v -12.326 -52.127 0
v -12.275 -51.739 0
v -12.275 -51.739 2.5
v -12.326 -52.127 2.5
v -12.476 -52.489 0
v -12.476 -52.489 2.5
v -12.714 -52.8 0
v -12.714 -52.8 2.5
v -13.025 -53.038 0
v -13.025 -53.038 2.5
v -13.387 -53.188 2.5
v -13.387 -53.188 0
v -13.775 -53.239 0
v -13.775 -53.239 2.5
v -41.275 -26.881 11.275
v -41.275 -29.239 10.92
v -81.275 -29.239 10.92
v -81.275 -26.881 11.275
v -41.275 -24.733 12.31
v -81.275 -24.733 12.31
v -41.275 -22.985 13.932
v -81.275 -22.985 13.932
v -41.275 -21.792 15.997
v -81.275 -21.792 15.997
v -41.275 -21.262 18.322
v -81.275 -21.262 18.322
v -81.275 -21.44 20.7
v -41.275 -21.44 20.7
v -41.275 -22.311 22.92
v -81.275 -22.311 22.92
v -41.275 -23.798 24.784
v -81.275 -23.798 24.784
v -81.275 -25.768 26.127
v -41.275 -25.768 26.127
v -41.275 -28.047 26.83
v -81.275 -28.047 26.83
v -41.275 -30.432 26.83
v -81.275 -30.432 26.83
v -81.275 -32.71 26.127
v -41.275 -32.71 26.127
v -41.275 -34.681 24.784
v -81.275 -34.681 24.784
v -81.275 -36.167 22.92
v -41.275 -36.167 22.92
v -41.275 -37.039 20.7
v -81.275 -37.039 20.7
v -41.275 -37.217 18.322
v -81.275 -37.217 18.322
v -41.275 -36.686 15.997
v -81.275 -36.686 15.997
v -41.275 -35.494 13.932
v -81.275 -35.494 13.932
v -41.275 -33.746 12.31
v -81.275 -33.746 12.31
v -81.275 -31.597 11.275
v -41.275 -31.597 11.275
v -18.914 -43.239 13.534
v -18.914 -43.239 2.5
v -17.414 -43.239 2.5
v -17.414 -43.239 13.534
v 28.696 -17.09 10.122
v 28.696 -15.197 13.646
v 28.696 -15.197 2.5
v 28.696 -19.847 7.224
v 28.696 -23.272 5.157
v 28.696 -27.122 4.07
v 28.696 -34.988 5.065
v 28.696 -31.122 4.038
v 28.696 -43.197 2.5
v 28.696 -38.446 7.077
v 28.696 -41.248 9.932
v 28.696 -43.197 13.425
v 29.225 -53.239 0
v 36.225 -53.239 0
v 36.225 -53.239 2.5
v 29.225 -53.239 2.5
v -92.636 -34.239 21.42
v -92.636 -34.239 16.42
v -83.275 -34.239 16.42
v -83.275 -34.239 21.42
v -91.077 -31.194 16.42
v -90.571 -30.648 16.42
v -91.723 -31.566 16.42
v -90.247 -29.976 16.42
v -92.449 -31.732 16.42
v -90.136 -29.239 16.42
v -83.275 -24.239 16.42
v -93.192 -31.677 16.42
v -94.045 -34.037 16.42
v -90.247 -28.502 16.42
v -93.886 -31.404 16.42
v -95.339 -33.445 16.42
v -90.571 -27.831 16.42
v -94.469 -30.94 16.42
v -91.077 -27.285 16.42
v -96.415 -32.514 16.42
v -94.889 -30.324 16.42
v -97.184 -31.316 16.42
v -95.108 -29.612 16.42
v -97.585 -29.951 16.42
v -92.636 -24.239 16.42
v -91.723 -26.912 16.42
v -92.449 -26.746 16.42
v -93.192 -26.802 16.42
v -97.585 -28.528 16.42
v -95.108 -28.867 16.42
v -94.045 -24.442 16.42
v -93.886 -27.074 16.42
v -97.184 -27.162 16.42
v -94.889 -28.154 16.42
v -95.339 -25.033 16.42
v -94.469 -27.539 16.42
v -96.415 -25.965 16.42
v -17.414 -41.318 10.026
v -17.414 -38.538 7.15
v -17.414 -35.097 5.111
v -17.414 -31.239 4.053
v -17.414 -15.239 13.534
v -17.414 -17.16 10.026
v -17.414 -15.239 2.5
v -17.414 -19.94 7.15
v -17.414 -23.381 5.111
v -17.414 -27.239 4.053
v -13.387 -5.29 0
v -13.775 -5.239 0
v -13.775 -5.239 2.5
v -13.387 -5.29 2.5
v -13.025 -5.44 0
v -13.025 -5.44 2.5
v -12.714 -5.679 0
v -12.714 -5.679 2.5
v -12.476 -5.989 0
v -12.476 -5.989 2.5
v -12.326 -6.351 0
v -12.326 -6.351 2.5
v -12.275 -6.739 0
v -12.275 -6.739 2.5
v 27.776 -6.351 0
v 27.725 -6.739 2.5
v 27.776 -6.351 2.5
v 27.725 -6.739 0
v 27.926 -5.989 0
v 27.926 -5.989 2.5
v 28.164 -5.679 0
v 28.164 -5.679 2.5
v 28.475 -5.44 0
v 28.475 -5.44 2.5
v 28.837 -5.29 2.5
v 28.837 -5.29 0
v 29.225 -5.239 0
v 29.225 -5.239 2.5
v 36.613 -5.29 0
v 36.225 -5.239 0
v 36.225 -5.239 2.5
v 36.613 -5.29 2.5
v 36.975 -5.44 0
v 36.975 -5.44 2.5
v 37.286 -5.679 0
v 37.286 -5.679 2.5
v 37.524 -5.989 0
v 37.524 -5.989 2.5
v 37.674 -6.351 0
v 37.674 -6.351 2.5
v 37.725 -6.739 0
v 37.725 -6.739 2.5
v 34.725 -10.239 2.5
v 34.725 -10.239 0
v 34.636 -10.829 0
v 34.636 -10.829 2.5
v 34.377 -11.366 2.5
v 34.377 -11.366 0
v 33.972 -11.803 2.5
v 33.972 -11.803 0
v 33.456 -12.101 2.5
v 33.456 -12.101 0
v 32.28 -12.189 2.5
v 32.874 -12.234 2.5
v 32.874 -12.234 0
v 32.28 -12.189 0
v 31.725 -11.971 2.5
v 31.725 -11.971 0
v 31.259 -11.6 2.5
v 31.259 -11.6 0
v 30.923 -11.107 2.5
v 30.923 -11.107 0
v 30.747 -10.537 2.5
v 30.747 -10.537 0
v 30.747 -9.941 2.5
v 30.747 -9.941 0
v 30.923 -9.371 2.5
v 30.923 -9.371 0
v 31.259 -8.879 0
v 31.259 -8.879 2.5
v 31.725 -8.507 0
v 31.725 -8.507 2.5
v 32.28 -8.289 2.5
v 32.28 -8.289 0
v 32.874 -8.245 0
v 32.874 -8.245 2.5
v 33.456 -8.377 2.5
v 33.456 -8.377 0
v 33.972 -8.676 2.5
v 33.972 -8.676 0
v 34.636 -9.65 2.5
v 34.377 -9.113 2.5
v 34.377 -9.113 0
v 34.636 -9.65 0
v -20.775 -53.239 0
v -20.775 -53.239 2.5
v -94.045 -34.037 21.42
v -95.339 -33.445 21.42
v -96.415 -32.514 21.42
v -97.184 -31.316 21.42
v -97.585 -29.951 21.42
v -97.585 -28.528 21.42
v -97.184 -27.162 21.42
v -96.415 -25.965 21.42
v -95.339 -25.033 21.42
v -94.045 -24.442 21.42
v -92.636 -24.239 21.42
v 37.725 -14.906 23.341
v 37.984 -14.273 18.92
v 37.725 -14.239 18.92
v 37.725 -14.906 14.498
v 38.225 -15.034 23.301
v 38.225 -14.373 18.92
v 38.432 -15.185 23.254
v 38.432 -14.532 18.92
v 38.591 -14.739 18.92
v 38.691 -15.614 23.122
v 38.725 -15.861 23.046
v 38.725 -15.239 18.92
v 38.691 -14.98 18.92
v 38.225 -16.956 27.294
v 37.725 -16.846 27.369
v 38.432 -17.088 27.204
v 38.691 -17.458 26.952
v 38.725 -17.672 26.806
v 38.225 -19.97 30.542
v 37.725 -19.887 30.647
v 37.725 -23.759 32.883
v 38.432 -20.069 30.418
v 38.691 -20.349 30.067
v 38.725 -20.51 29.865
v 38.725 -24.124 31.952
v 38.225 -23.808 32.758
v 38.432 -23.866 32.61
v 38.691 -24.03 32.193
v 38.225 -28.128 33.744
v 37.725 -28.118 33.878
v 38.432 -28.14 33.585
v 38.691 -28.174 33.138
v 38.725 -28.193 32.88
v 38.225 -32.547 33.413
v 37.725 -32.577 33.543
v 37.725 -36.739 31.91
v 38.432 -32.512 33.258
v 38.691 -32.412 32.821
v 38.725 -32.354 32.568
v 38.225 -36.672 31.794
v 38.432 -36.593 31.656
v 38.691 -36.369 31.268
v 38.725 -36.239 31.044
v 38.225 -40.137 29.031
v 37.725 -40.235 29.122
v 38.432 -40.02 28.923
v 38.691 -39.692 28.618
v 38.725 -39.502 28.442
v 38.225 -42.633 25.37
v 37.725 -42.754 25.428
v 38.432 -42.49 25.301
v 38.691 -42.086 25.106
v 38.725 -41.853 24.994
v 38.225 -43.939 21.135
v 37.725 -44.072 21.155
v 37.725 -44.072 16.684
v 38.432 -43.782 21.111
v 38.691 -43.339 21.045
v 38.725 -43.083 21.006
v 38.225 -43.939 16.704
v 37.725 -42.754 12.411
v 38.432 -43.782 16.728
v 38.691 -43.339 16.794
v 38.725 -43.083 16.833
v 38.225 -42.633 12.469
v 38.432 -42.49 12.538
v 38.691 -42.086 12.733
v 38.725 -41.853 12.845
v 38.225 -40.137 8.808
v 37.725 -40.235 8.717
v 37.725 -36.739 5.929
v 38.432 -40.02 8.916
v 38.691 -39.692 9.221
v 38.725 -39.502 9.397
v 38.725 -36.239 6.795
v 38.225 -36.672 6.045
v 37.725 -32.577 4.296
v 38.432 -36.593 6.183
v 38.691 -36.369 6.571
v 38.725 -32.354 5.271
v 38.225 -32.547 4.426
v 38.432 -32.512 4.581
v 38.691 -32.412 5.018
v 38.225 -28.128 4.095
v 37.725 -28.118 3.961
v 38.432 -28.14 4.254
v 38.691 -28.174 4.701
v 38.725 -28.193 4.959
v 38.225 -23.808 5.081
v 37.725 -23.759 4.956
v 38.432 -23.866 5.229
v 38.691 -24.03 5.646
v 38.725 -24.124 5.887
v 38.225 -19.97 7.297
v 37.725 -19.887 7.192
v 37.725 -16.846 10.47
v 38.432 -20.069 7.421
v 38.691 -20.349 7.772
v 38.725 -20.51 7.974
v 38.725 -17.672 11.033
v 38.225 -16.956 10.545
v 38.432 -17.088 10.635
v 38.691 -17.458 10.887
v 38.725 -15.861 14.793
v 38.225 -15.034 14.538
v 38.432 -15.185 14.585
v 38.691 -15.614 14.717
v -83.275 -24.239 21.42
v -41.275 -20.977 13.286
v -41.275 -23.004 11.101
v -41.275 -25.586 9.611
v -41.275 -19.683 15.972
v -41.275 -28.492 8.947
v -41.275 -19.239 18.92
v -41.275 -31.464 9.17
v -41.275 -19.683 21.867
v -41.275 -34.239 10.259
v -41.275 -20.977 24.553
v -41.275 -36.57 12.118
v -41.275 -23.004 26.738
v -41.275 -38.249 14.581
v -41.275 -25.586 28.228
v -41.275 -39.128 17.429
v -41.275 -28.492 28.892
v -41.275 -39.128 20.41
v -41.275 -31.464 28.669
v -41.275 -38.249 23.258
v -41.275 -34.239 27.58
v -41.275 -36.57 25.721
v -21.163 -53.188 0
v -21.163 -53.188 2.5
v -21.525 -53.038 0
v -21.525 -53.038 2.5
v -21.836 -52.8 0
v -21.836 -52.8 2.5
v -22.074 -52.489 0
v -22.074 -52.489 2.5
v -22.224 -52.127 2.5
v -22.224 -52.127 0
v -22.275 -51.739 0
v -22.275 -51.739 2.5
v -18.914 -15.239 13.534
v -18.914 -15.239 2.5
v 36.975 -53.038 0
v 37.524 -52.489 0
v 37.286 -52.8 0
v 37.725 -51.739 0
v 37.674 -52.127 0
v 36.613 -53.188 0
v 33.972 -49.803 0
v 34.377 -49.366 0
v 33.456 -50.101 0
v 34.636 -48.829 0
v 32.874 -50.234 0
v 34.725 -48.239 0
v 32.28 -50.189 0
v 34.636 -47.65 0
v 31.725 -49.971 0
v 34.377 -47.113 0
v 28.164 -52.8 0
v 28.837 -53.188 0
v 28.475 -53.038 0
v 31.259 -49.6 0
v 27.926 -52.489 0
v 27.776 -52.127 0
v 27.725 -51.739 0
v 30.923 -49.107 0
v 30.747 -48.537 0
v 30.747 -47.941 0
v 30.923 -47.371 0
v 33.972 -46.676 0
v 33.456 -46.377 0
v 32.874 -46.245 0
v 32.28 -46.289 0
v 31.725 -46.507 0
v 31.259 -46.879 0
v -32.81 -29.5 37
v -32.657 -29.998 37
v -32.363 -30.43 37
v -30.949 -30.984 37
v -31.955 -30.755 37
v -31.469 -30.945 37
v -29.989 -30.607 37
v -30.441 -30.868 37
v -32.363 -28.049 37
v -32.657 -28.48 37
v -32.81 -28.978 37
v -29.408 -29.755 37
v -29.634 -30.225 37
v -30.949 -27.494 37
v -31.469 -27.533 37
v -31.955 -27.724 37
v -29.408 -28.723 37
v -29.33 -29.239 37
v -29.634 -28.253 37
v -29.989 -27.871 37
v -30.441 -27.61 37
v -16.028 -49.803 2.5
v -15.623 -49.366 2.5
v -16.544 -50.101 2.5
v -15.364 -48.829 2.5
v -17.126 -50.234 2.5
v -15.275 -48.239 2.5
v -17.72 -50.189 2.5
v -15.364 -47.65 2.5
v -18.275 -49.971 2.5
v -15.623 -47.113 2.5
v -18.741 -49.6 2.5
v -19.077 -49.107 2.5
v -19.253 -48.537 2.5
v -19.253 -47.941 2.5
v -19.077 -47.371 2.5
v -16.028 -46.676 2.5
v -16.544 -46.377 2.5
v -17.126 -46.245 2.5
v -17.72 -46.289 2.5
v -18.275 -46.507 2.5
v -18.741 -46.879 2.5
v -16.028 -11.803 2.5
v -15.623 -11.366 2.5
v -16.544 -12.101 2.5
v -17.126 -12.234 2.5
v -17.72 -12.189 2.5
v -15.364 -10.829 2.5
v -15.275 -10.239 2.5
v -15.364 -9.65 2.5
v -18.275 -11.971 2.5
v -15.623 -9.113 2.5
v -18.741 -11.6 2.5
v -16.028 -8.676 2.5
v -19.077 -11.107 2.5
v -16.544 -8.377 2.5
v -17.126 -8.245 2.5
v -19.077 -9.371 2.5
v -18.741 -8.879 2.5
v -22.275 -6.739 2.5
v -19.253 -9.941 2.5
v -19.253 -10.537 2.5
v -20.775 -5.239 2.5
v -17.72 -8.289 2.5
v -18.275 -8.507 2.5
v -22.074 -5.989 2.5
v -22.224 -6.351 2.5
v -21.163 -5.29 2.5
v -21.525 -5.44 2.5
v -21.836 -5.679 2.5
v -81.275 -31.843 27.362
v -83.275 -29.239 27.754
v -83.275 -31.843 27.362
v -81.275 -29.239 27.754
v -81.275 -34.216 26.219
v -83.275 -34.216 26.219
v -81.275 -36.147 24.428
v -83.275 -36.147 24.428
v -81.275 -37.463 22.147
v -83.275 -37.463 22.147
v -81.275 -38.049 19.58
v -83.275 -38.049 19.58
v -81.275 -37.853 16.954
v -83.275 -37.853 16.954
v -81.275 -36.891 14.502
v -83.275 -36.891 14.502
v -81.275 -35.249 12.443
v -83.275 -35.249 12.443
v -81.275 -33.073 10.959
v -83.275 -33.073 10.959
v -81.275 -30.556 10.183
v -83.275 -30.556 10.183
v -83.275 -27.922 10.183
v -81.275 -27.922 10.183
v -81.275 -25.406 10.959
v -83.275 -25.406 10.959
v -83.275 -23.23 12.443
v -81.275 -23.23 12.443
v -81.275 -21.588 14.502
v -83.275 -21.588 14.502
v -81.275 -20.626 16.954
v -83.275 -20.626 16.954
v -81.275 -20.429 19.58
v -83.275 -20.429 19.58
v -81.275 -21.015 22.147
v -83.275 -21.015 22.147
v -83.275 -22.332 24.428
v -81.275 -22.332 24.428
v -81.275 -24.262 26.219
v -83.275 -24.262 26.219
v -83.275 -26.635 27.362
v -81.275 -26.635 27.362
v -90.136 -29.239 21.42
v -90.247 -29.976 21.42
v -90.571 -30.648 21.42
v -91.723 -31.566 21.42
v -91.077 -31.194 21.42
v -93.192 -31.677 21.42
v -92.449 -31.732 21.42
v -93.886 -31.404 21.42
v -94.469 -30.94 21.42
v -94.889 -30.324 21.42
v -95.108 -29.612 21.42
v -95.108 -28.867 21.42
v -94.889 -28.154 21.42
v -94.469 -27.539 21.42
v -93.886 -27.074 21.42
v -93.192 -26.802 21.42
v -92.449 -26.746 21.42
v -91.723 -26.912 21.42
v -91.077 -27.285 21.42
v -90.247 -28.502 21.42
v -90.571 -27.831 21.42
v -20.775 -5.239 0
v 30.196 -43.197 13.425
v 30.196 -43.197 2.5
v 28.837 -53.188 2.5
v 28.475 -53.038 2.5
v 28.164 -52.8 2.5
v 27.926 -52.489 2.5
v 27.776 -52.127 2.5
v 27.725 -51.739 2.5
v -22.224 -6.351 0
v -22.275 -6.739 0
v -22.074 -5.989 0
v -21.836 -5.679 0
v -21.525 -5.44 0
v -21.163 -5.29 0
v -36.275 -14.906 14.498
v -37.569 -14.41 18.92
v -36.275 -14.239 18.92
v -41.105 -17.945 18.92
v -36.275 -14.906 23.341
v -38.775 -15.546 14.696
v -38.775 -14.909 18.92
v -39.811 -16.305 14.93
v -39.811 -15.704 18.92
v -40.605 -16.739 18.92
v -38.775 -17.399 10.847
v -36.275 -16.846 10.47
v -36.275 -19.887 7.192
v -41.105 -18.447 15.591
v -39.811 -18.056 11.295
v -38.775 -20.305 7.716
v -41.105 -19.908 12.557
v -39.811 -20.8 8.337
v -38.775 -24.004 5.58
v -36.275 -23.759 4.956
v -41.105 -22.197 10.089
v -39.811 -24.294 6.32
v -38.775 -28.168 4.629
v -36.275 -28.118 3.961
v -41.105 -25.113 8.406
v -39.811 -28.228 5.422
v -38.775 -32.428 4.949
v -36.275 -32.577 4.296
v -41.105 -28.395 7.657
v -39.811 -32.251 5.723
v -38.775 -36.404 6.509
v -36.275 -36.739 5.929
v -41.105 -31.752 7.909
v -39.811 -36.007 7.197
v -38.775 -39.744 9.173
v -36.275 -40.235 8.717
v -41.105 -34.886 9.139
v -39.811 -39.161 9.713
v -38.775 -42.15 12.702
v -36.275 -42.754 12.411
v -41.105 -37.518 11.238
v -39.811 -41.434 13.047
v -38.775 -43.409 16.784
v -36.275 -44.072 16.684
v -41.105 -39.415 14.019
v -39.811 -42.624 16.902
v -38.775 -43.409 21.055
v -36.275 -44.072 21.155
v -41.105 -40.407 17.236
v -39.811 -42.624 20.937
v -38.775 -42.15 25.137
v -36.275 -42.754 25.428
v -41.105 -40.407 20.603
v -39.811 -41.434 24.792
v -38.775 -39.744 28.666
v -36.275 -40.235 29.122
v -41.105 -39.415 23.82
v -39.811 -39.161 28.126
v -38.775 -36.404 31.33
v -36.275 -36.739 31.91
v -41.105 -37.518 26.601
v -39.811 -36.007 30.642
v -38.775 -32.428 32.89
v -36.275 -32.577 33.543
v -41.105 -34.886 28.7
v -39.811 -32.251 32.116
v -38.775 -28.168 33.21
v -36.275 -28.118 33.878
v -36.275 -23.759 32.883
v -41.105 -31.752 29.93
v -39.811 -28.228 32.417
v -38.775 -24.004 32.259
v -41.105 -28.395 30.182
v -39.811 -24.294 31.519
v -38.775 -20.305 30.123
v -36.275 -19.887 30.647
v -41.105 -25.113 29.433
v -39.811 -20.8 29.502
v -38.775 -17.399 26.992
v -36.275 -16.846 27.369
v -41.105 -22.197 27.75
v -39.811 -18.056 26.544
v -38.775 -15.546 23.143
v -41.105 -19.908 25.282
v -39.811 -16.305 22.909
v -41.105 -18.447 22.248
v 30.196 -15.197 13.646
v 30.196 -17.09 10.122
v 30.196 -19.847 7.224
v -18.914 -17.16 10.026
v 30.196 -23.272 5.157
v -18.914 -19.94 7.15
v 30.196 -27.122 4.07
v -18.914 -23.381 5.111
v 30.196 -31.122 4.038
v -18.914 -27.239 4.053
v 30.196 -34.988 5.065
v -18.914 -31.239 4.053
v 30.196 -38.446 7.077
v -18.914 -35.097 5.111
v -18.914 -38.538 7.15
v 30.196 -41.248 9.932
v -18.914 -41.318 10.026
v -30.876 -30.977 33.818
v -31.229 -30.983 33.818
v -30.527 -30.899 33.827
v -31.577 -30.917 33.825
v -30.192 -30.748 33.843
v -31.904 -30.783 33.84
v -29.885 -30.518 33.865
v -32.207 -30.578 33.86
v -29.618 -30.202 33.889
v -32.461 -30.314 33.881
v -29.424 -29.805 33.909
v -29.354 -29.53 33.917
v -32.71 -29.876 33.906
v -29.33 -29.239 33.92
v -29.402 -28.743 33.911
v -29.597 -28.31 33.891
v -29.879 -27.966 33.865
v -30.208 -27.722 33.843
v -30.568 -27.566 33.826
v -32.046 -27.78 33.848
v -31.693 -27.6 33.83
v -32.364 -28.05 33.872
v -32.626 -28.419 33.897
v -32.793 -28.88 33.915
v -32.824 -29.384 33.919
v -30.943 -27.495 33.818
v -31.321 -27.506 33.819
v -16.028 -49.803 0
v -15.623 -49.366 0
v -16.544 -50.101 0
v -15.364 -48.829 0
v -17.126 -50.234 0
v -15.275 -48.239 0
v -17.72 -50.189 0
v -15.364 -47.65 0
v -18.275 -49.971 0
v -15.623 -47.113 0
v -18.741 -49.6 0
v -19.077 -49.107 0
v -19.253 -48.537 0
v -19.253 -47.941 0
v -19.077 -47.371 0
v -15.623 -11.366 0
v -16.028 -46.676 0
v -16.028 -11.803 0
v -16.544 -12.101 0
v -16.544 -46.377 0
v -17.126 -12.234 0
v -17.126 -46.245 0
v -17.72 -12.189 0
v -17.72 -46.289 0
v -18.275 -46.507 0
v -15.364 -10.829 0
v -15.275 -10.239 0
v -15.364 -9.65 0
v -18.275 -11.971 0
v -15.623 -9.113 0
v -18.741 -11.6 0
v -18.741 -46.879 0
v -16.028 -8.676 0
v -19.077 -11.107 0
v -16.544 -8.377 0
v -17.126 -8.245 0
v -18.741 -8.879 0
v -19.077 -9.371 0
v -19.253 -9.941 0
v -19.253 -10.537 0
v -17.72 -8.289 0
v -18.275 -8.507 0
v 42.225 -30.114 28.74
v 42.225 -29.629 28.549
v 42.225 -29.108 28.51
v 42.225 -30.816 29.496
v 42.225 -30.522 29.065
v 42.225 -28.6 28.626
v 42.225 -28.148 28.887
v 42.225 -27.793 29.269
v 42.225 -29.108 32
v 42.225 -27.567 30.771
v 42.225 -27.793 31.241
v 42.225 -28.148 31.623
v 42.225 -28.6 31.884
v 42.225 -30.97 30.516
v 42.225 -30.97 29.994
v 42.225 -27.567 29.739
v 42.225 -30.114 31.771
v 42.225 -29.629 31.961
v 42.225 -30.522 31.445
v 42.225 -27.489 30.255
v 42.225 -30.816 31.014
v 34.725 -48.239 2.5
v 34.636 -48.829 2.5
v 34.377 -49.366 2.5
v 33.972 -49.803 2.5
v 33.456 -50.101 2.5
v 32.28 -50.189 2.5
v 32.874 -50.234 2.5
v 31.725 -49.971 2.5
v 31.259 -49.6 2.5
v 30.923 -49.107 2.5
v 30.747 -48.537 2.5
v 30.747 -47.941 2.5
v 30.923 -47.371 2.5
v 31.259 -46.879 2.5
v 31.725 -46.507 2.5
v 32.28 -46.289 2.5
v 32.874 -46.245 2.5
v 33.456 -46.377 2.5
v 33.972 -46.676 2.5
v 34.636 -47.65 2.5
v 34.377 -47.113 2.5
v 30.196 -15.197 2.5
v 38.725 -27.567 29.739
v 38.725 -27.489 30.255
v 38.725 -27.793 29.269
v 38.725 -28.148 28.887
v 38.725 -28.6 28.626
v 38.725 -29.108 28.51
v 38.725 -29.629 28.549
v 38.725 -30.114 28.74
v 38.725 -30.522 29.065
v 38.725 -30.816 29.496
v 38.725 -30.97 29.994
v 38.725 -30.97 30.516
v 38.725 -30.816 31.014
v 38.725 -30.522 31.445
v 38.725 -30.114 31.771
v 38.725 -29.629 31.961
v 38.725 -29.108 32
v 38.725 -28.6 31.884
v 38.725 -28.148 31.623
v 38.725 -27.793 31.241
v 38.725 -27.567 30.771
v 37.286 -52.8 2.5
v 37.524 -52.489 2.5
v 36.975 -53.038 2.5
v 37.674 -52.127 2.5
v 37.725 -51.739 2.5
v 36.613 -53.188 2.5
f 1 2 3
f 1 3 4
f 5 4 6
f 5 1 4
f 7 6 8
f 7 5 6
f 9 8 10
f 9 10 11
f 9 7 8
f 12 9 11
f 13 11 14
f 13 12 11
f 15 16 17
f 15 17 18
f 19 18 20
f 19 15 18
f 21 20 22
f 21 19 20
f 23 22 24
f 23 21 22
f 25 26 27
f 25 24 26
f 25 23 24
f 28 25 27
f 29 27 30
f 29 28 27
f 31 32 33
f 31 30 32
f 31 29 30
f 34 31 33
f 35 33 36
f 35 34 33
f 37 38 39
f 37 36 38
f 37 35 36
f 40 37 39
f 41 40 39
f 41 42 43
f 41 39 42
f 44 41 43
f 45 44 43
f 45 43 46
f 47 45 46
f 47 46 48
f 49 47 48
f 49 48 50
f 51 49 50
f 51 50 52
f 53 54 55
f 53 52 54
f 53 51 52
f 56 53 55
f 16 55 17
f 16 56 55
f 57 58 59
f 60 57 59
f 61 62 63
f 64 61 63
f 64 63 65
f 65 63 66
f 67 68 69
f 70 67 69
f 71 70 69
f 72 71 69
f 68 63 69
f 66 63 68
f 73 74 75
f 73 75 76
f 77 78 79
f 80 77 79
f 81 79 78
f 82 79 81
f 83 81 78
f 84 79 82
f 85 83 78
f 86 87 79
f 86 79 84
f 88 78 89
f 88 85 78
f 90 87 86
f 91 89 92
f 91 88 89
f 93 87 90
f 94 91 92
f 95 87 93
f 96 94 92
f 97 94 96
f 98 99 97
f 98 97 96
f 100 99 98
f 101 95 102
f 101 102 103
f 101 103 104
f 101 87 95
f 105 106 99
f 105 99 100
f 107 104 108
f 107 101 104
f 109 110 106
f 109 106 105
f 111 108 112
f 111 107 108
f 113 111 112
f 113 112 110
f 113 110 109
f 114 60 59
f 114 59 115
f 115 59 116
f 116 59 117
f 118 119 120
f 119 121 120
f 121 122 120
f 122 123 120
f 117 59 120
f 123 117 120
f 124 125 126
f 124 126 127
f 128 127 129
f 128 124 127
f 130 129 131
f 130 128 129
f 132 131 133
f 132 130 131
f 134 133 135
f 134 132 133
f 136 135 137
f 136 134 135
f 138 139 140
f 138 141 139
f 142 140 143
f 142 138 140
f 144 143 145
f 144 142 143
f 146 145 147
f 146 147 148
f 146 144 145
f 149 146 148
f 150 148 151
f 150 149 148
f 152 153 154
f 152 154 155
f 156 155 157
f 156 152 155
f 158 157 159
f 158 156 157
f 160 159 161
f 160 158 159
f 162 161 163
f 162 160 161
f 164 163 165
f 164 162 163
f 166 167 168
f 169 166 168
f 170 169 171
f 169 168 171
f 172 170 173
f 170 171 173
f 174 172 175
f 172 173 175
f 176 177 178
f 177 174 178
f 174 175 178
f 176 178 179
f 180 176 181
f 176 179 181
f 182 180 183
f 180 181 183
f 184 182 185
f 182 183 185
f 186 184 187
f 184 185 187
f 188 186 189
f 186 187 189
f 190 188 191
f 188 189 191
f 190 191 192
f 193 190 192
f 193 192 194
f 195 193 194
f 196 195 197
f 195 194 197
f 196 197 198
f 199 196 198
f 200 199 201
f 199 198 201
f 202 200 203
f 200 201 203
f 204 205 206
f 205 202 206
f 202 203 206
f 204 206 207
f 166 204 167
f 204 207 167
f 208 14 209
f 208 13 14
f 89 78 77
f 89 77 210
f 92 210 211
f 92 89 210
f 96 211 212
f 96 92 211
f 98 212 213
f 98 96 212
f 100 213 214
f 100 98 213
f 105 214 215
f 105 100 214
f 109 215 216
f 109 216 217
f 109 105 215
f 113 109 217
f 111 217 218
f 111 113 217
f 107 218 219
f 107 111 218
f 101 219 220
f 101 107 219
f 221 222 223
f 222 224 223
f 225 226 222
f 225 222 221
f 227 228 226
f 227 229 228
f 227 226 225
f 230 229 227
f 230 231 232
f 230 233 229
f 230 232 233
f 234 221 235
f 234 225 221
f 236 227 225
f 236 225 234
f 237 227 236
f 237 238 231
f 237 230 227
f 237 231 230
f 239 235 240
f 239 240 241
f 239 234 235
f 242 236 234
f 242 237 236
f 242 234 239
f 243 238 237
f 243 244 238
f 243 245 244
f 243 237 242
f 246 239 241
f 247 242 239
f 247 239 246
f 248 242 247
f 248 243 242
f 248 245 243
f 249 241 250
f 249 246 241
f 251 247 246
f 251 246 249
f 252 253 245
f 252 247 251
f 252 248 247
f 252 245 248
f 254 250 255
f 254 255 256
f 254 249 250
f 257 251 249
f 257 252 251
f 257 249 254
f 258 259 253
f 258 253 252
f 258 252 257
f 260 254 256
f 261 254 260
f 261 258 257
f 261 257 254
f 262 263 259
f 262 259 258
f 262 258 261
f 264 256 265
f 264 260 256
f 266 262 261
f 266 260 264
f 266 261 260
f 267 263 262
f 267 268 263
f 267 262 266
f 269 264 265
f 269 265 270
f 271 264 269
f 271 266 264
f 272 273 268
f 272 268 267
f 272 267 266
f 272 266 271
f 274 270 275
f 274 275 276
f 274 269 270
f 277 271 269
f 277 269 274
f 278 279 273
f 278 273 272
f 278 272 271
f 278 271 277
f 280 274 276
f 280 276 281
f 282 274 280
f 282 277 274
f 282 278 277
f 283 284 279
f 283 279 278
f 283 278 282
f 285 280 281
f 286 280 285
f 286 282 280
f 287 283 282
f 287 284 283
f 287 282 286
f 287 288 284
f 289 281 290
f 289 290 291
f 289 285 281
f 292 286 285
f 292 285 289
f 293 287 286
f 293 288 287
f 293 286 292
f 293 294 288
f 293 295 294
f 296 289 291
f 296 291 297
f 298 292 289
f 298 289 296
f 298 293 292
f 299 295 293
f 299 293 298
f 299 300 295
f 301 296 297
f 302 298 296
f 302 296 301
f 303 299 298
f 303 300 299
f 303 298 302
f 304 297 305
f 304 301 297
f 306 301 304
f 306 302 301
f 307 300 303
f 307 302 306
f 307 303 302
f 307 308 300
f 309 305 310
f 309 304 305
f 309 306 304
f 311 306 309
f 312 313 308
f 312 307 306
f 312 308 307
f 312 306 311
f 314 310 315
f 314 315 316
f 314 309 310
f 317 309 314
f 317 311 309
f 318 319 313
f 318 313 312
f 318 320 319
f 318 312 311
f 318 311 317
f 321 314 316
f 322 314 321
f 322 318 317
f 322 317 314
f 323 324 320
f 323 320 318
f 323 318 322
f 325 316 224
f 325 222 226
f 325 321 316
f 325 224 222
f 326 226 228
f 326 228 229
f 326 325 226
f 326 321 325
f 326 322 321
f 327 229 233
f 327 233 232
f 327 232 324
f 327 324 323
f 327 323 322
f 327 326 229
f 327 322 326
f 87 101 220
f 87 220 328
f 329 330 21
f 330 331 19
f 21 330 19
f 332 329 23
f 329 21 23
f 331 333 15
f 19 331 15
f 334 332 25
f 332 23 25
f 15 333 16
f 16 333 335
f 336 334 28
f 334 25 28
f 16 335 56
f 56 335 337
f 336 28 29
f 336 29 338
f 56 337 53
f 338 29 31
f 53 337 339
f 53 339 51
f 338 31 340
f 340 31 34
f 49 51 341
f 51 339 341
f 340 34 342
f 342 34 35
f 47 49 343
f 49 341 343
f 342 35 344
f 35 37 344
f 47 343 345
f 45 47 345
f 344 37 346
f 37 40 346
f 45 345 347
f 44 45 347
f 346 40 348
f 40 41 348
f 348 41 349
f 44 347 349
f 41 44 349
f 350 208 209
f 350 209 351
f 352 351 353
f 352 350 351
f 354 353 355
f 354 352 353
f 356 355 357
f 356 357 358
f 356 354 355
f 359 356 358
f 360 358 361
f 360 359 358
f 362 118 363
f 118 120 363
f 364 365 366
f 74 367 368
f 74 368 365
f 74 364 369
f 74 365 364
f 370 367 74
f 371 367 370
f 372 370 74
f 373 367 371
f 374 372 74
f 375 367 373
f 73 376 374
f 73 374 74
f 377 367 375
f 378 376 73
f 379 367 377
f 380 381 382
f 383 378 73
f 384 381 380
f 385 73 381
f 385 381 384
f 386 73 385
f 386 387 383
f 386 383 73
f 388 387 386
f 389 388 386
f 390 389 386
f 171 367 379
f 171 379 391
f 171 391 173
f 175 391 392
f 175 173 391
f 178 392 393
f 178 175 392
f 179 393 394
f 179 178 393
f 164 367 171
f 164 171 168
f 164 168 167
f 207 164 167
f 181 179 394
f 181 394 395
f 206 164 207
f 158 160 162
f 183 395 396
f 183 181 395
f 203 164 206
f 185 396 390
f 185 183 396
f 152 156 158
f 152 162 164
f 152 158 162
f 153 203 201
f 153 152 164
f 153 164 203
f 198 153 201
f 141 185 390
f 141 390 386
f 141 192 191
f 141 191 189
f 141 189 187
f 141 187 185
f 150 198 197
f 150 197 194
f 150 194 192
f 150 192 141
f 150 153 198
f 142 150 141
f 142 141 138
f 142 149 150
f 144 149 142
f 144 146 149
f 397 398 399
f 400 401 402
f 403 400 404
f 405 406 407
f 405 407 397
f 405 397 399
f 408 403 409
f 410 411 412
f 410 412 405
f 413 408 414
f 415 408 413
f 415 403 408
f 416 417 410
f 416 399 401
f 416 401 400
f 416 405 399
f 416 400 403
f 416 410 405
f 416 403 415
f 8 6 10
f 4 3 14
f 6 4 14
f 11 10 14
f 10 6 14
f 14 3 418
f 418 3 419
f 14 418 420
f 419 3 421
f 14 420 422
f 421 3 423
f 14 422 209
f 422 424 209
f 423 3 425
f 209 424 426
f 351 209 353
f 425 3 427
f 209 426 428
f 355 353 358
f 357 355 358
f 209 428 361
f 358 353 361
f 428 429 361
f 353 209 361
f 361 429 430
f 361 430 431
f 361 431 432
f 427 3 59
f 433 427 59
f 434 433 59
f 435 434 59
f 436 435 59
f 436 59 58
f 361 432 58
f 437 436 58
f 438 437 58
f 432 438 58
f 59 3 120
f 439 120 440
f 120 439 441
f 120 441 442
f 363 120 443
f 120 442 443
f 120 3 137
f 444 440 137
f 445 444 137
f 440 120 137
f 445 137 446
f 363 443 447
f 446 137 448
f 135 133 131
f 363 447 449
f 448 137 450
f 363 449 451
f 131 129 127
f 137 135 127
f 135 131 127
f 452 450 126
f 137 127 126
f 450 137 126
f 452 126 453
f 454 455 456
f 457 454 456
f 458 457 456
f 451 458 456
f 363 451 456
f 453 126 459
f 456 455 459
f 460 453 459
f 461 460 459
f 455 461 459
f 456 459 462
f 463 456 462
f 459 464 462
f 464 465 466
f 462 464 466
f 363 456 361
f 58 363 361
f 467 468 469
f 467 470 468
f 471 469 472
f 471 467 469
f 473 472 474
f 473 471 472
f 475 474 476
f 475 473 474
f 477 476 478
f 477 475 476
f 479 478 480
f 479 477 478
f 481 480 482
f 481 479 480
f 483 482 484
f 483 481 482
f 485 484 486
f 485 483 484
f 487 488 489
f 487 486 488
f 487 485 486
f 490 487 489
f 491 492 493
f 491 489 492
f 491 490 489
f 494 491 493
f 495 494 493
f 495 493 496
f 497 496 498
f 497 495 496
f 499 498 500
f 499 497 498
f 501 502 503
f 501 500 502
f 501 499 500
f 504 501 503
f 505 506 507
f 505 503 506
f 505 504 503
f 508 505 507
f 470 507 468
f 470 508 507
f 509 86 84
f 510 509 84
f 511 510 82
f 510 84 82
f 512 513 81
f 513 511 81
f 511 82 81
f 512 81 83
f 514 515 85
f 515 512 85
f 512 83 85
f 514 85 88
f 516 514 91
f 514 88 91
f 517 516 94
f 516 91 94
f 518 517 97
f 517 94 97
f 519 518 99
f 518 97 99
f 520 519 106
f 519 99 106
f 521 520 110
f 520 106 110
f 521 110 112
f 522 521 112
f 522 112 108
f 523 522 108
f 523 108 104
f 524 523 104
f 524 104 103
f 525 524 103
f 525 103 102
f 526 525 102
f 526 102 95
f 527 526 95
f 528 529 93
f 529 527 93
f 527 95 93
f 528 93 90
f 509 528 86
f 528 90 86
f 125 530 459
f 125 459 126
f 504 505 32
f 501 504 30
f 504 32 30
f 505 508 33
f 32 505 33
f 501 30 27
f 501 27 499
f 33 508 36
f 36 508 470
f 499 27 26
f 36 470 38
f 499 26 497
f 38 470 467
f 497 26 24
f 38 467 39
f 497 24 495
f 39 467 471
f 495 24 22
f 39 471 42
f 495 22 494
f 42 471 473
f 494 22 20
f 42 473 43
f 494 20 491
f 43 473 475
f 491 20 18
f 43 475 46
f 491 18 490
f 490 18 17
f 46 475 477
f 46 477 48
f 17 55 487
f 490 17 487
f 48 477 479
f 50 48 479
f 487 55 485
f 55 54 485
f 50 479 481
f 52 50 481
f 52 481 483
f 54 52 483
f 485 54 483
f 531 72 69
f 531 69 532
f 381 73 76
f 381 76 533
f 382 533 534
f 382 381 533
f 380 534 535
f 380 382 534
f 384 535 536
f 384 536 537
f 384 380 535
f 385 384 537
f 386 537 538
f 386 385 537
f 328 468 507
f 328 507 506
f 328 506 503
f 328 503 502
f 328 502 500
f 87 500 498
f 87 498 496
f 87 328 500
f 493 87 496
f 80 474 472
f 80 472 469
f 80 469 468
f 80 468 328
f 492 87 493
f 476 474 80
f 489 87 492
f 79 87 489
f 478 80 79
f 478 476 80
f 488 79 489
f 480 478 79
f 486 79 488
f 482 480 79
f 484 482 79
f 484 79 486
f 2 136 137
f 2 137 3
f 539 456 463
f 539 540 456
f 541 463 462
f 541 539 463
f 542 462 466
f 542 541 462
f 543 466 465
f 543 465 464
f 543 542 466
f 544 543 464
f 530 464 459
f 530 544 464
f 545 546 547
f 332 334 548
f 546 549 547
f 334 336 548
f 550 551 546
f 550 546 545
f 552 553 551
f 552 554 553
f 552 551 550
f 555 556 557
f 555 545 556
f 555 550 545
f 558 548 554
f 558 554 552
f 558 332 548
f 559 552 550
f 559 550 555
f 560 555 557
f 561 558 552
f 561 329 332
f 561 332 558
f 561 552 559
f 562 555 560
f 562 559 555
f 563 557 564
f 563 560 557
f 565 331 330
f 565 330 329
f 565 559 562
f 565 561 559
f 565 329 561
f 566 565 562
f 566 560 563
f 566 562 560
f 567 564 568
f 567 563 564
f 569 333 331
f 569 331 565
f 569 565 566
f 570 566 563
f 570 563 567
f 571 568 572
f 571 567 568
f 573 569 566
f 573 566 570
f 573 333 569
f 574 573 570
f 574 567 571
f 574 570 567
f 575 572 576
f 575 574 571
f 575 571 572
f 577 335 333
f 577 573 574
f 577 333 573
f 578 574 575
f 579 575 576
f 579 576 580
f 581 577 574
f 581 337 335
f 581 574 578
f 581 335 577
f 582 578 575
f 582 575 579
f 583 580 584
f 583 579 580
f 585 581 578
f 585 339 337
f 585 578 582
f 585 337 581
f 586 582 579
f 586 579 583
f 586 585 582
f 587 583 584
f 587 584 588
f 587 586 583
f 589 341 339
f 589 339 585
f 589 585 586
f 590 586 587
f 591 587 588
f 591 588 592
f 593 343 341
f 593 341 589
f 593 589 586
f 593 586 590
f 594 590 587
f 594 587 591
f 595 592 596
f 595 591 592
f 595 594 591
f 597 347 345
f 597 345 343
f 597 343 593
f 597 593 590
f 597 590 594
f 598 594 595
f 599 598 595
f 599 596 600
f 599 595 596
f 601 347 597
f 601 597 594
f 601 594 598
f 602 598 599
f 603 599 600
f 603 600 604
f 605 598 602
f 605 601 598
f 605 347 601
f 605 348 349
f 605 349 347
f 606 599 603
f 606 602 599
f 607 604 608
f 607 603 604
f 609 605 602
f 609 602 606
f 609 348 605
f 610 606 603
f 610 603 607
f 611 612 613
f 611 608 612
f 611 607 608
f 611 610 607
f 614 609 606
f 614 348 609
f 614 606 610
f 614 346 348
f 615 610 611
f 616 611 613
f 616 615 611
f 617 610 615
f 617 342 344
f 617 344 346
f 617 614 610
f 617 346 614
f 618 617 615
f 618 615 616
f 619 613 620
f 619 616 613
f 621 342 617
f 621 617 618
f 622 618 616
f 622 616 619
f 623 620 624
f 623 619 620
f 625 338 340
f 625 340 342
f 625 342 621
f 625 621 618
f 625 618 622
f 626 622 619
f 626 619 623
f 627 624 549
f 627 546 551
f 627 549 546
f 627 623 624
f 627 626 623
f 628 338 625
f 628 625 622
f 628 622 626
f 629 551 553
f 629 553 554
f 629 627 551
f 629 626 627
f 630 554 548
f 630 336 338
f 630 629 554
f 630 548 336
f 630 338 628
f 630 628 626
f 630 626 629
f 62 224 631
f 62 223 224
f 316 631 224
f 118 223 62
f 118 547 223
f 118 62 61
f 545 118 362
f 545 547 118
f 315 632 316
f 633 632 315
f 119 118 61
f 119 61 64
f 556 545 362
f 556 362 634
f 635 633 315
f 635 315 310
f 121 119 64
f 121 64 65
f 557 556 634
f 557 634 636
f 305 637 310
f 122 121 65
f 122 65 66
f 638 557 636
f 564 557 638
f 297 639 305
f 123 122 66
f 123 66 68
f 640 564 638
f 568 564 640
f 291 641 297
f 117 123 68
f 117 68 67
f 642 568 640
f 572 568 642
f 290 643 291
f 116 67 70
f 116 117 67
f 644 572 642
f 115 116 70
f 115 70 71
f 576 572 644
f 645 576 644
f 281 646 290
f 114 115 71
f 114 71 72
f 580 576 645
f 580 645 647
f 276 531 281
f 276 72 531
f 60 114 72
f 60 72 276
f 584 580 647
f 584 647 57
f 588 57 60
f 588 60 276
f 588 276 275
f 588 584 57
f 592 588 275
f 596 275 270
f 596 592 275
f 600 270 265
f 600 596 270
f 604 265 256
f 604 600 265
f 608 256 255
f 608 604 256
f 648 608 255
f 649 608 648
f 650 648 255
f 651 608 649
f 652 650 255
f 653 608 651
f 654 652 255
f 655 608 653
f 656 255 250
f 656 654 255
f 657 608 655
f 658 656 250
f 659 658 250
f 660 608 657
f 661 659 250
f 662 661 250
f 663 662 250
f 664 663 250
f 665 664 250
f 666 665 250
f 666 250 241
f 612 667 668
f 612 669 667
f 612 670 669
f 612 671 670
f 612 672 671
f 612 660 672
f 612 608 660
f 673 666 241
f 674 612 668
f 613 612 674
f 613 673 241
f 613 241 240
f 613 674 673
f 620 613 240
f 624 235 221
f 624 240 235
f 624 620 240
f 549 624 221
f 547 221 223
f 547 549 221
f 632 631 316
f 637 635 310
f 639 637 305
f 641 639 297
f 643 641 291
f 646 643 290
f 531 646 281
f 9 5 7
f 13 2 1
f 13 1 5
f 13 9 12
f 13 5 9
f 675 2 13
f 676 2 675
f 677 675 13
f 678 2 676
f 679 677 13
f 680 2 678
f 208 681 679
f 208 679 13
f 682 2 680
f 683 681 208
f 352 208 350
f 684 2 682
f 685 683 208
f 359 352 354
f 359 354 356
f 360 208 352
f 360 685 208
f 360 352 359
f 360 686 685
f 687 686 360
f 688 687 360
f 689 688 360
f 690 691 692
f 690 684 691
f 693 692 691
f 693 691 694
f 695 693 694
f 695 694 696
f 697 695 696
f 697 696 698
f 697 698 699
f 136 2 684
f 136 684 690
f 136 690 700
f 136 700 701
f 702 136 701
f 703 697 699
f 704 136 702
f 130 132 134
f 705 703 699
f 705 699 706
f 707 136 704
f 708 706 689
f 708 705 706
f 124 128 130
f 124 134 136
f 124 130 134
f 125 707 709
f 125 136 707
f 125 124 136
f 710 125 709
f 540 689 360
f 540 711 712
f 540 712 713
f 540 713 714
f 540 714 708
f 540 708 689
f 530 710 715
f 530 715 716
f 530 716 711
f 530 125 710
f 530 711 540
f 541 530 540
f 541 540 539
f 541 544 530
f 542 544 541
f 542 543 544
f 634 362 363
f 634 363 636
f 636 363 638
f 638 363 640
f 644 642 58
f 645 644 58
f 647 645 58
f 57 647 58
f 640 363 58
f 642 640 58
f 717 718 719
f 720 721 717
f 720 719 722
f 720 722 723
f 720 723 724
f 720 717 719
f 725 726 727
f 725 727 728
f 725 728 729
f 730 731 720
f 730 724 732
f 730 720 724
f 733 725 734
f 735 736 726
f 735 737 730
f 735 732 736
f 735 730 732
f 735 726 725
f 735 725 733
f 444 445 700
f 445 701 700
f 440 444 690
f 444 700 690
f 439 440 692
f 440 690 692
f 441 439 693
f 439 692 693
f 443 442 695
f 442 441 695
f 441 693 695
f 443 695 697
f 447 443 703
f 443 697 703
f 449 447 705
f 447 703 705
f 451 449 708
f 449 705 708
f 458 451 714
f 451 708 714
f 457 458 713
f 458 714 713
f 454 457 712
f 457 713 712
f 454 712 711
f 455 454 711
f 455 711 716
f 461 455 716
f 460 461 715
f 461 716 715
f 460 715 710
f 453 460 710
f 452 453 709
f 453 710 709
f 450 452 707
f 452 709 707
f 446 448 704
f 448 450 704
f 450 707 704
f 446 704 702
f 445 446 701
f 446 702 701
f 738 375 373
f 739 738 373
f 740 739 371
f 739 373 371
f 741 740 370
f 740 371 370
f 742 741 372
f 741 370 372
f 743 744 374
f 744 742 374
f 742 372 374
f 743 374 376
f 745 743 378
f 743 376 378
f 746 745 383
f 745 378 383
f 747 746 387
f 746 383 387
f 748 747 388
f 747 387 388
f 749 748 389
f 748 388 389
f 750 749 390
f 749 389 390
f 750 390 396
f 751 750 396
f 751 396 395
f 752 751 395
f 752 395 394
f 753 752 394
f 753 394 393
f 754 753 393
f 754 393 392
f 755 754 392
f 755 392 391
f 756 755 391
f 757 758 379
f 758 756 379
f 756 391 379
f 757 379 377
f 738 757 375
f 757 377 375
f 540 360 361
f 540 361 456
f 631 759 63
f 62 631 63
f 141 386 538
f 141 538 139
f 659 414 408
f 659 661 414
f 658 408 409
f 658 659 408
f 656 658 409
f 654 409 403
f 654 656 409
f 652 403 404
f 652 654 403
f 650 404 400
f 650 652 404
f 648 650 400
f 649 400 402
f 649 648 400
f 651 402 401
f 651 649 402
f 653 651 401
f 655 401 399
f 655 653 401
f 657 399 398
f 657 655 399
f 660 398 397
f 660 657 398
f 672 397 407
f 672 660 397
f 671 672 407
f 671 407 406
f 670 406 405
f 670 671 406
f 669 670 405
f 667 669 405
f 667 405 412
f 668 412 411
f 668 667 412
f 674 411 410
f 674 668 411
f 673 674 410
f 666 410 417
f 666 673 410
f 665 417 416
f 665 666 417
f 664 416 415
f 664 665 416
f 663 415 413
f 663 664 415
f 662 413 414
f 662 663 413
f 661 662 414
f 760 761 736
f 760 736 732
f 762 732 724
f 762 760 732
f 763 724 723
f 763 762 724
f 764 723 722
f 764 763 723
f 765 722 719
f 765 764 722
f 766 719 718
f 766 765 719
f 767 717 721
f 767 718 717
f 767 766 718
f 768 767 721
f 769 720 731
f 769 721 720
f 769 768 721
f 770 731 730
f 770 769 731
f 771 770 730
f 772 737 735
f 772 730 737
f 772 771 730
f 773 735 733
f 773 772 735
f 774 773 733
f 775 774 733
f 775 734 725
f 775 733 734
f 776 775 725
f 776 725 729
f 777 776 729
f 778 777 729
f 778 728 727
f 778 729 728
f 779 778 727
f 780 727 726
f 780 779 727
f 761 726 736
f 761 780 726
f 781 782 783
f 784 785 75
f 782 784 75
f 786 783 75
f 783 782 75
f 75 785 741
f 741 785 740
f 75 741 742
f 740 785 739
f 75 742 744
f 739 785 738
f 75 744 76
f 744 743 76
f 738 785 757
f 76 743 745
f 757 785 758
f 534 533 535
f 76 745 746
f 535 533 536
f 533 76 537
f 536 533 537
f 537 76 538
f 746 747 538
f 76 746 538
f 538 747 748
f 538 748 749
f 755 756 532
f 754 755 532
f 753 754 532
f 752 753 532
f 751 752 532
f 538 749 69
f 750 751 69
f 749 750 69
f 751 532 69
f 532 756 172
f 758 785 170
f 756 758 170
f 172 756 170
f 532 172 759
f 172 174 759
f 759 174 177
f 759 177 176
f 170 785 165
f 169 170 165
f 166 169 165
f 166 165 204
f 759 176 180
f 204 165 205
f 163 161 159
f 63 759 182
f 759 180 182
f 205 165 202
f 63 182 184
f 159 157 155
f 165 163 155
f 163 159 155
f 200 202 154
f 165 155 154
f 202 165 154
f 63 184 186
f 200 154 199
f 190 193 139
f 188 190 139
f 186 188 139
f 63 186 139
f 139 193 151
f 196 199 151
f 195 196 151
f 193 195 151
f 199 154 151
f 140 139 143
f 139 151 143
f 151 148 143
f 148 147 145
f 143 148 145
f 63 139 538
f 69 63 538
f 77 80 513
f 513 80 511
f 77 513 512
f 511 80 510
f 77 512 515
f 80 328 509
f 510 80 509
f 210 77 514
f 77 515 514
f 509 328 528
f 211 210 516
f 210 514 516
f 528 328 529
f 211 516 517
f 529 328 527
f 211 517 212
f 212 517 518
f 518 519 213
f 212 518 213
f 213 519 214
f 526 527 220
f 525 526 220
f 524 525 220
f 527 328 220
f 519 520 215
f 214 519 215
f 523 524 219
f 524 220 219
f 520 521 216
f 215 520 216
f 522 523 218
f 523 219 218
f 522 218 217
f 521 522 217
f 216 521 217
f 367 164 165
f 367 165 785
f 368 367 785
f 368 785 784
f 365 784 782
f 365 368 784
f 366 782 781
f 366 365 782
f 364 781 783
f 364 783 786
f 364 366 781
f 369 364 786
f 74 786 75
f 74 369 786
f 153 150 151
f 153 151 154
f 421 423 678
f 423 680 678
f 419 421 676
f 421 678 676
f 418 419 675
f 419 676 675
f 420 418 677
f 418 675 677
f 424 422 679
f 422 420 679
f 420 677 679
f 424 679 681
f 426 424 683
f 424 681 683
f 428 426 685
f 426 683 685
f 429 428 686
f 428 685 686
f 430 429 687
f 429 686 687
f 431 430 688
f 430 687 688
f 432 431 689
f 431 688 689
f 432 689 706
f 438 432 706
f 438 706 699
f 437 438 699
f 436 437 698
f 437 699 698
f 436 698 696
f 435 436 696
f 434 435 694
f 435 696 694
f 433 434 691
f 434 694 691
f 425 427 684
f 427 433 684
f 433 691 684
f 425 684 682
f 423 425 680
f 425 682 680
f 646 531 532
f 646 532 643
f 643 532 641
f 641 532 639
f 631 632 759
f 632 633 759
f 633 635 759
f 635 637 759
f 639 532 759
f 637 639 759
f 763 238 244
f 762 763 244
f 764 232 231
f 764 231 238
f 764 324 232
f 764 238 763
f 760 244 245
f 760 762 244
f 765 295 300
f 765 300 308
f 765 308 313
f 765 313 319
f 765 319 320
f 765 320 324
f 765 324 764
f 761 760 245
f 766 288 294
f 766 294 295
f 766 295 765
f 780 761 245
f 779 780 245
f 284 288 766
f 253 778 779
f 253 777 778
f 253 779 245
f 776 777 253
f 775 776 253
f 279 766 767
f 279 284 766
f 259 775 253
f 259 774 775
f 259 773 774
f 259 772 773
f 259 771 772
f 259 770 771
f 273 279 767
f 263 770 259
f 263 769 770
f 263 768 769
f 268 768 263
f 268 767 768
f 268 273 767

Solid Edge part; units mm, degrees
sketch "Sketch1" plane through (-41.275, 0, 0) normal (1, 0, 0) x (0, 1, 0)
  circle A0 centre (-29.2392, 18.9195) radius 15
extrude "ExtrudedProtrusion_1" add sketch "Sketch1" along normal blind 80
fillet "Round_1" radius 1 1 edges at (38.725, -44.2392, 18.9195)
fillet "Round_2" radius 5 1 edges at (-41.275, -44.2392, 18.9195)
sketch "Sketch2" plane through (-41.275, -29.2392, 18.9195) normal (-1, 0, 0) x (0, 0, -1)
  circle A0 centre (0, 0) radius 8
extrude "ExtrudedProtrusion_2" add sketch "Sketch2" along normal blind 40
sketch "Sketch3" plane through (0, 0, 32) normal (0, 0, 1) x (1, 0, 0)
  circle A0 centre (-31.0799, -29.2392) radius 1.75
extrude "ExtrudedProtrusion_3" add sketch "Sketch3" along normal blind 5
sketch "Sketch4" plane through (38.725, -29.2392, 18.9195) normal (1, 0, 0) x (0, 1, 0)
  circle A0 centre (0, 11.3356) radius 1.75
extrude "ExtrudedProtrusion_4" add sketch "Sketch4" along normal blind 3.5
sketch "Sketch5" plane through (0, 0, 0) normal (0, 0, 1) x (1, 0, 0)
  circle A0 centre (32.725, -10.2392) radius 2
  circle A1 centre (32.725, -48.2392) radius 2
  line L0 (-20.775, -5.2392) -> (-13.775, -5.2392)
  arc A2 (-13.775, -5.2392) -> (-12.275, -6.7392) centre (-13.775, -6.7392) cw
  line L1 (-12.275, -6.7392) -> (-12.275, -51.7392)
  arc A3 (-12.275, -51.7392) -> (-13.775, -53.2392) centre (-13.775, -51.7392) cw
  line L2 (-13.775, -53.2392) -> (-20.775, -53.2392)
  arc A4 (-20.775, -53.2392) -> (-22.275, -51.7392) centre (-20.775, -51.7392) cw
  line L3 (-22.275, -51.7392) -> (-22.275, -6.7392)
  arc A5 (-22.275, -6.7392) -> (-20.775, -5.2392) centre (-20.775, -6.7392) cw
  circle A6 centre (-17.275, -10.2392) radius 2
  circle A7 centre (-17.275, -48.2392) radius 2
  line L4 (29.225, -5.2392) -> (36.225, -5.2392)
  arc A8 (36.225, -5.2392) -> (37.725, -6.7392) centre (36.225, -6.7392) cw
  line L5 (37.725, -6.7392) -> (37.725, -51.7392)
  arc A9 (37.725, -51.7392) -> (36.225, -53.2392) centre (36.225, -51.7392) cw
  line L6 (36.225, -53.2392) -> (29.225, -53.2392)
  arc A10 (29.225, -53.2392) -> (27.725, -51.7392) centre (29.225, -51.7392) cw
  line L7 (27.725, -51.7392) -> (27.725, -6.7392)
  arc A11 (27.725, -6.7392) -> (29.225, -5.2392) centre (29.225, -6.7392) cw
  dimension "D1" = 45
  dimension "D2" = 7
  dimension "D3" = 5
  dimension "D4" = 5
  dimension "D5" = 38
  dimension "D6" = 10
  dimension "D7" = 48
  dimension "D8" = 38
  dimension "D9" = 5
  dimension "D10" = 5
  dimension "D11" = 5
  dimension "D12" = 5
  dimension "D13" = 50
extrude "ExtrudedProtrusion_5" add sketch "Sketch5" along normal blind 2.5
sketch "Sketch6" plane through (43.6955, -29.1968, 2.5) normal (0, 0, 1) x (0, 1, 0)
  line L0 (-14, 13.5) -> (14, 13.5)
  line L1 (14, 13.5) -> (14, 15)
  line L2 (14, 15) -> (-14, 15)
  line L3 (-14, 15) -> (-14, 13.5)
  line L4 (-14.0424, 61.11) -> (13.9576, 61.11)
  line L5 (13.9576, 61.11) -> (13.9576, 62.61)
  line L6 (13.9576, 62.61) -> (-14.0424, 62.61)
  line L7 (-14.0424, 62.61) -> (-14.0424, 61.11)
extrude "Protrusion1" add sketch "Sketch6" along normal up to vertex (16.4195 mm away)
sketch "Sketch7" plane through (-81.275, -29.2392, 18.9195) normal (-1, 0, 0) x (0, 0, 1)
  circle A0 centre (0, 0) radius 8.835
extrude "ExtrudedProtrusion_7" add sketch "Sketch7" along normal blind 2
sketch "Sketch8" plane through (0, 0, 18.9195) normal (0, 0, 1) x (1, 0, 0)
  circle A0 centre (-92.6361, -29.2392) radius 2.5
  line L0 (-92.6361, -24.2392) -> (-83.275, -24.2392)
  line L1 (-83.275, -24.2392) -> (-83.275, -34.2392)
  line L2 (-92.6361, -34.2392) -> (-83.275, -34.2392)
  arc A1 (-92.6361, -34.2392) -> (-92.6361, -24.2392) centre (-92.6361, -29.2392) cw
extrude "ExtrudedProtrusion_8" add sketch "Sketch8" along normal mid plane 5
